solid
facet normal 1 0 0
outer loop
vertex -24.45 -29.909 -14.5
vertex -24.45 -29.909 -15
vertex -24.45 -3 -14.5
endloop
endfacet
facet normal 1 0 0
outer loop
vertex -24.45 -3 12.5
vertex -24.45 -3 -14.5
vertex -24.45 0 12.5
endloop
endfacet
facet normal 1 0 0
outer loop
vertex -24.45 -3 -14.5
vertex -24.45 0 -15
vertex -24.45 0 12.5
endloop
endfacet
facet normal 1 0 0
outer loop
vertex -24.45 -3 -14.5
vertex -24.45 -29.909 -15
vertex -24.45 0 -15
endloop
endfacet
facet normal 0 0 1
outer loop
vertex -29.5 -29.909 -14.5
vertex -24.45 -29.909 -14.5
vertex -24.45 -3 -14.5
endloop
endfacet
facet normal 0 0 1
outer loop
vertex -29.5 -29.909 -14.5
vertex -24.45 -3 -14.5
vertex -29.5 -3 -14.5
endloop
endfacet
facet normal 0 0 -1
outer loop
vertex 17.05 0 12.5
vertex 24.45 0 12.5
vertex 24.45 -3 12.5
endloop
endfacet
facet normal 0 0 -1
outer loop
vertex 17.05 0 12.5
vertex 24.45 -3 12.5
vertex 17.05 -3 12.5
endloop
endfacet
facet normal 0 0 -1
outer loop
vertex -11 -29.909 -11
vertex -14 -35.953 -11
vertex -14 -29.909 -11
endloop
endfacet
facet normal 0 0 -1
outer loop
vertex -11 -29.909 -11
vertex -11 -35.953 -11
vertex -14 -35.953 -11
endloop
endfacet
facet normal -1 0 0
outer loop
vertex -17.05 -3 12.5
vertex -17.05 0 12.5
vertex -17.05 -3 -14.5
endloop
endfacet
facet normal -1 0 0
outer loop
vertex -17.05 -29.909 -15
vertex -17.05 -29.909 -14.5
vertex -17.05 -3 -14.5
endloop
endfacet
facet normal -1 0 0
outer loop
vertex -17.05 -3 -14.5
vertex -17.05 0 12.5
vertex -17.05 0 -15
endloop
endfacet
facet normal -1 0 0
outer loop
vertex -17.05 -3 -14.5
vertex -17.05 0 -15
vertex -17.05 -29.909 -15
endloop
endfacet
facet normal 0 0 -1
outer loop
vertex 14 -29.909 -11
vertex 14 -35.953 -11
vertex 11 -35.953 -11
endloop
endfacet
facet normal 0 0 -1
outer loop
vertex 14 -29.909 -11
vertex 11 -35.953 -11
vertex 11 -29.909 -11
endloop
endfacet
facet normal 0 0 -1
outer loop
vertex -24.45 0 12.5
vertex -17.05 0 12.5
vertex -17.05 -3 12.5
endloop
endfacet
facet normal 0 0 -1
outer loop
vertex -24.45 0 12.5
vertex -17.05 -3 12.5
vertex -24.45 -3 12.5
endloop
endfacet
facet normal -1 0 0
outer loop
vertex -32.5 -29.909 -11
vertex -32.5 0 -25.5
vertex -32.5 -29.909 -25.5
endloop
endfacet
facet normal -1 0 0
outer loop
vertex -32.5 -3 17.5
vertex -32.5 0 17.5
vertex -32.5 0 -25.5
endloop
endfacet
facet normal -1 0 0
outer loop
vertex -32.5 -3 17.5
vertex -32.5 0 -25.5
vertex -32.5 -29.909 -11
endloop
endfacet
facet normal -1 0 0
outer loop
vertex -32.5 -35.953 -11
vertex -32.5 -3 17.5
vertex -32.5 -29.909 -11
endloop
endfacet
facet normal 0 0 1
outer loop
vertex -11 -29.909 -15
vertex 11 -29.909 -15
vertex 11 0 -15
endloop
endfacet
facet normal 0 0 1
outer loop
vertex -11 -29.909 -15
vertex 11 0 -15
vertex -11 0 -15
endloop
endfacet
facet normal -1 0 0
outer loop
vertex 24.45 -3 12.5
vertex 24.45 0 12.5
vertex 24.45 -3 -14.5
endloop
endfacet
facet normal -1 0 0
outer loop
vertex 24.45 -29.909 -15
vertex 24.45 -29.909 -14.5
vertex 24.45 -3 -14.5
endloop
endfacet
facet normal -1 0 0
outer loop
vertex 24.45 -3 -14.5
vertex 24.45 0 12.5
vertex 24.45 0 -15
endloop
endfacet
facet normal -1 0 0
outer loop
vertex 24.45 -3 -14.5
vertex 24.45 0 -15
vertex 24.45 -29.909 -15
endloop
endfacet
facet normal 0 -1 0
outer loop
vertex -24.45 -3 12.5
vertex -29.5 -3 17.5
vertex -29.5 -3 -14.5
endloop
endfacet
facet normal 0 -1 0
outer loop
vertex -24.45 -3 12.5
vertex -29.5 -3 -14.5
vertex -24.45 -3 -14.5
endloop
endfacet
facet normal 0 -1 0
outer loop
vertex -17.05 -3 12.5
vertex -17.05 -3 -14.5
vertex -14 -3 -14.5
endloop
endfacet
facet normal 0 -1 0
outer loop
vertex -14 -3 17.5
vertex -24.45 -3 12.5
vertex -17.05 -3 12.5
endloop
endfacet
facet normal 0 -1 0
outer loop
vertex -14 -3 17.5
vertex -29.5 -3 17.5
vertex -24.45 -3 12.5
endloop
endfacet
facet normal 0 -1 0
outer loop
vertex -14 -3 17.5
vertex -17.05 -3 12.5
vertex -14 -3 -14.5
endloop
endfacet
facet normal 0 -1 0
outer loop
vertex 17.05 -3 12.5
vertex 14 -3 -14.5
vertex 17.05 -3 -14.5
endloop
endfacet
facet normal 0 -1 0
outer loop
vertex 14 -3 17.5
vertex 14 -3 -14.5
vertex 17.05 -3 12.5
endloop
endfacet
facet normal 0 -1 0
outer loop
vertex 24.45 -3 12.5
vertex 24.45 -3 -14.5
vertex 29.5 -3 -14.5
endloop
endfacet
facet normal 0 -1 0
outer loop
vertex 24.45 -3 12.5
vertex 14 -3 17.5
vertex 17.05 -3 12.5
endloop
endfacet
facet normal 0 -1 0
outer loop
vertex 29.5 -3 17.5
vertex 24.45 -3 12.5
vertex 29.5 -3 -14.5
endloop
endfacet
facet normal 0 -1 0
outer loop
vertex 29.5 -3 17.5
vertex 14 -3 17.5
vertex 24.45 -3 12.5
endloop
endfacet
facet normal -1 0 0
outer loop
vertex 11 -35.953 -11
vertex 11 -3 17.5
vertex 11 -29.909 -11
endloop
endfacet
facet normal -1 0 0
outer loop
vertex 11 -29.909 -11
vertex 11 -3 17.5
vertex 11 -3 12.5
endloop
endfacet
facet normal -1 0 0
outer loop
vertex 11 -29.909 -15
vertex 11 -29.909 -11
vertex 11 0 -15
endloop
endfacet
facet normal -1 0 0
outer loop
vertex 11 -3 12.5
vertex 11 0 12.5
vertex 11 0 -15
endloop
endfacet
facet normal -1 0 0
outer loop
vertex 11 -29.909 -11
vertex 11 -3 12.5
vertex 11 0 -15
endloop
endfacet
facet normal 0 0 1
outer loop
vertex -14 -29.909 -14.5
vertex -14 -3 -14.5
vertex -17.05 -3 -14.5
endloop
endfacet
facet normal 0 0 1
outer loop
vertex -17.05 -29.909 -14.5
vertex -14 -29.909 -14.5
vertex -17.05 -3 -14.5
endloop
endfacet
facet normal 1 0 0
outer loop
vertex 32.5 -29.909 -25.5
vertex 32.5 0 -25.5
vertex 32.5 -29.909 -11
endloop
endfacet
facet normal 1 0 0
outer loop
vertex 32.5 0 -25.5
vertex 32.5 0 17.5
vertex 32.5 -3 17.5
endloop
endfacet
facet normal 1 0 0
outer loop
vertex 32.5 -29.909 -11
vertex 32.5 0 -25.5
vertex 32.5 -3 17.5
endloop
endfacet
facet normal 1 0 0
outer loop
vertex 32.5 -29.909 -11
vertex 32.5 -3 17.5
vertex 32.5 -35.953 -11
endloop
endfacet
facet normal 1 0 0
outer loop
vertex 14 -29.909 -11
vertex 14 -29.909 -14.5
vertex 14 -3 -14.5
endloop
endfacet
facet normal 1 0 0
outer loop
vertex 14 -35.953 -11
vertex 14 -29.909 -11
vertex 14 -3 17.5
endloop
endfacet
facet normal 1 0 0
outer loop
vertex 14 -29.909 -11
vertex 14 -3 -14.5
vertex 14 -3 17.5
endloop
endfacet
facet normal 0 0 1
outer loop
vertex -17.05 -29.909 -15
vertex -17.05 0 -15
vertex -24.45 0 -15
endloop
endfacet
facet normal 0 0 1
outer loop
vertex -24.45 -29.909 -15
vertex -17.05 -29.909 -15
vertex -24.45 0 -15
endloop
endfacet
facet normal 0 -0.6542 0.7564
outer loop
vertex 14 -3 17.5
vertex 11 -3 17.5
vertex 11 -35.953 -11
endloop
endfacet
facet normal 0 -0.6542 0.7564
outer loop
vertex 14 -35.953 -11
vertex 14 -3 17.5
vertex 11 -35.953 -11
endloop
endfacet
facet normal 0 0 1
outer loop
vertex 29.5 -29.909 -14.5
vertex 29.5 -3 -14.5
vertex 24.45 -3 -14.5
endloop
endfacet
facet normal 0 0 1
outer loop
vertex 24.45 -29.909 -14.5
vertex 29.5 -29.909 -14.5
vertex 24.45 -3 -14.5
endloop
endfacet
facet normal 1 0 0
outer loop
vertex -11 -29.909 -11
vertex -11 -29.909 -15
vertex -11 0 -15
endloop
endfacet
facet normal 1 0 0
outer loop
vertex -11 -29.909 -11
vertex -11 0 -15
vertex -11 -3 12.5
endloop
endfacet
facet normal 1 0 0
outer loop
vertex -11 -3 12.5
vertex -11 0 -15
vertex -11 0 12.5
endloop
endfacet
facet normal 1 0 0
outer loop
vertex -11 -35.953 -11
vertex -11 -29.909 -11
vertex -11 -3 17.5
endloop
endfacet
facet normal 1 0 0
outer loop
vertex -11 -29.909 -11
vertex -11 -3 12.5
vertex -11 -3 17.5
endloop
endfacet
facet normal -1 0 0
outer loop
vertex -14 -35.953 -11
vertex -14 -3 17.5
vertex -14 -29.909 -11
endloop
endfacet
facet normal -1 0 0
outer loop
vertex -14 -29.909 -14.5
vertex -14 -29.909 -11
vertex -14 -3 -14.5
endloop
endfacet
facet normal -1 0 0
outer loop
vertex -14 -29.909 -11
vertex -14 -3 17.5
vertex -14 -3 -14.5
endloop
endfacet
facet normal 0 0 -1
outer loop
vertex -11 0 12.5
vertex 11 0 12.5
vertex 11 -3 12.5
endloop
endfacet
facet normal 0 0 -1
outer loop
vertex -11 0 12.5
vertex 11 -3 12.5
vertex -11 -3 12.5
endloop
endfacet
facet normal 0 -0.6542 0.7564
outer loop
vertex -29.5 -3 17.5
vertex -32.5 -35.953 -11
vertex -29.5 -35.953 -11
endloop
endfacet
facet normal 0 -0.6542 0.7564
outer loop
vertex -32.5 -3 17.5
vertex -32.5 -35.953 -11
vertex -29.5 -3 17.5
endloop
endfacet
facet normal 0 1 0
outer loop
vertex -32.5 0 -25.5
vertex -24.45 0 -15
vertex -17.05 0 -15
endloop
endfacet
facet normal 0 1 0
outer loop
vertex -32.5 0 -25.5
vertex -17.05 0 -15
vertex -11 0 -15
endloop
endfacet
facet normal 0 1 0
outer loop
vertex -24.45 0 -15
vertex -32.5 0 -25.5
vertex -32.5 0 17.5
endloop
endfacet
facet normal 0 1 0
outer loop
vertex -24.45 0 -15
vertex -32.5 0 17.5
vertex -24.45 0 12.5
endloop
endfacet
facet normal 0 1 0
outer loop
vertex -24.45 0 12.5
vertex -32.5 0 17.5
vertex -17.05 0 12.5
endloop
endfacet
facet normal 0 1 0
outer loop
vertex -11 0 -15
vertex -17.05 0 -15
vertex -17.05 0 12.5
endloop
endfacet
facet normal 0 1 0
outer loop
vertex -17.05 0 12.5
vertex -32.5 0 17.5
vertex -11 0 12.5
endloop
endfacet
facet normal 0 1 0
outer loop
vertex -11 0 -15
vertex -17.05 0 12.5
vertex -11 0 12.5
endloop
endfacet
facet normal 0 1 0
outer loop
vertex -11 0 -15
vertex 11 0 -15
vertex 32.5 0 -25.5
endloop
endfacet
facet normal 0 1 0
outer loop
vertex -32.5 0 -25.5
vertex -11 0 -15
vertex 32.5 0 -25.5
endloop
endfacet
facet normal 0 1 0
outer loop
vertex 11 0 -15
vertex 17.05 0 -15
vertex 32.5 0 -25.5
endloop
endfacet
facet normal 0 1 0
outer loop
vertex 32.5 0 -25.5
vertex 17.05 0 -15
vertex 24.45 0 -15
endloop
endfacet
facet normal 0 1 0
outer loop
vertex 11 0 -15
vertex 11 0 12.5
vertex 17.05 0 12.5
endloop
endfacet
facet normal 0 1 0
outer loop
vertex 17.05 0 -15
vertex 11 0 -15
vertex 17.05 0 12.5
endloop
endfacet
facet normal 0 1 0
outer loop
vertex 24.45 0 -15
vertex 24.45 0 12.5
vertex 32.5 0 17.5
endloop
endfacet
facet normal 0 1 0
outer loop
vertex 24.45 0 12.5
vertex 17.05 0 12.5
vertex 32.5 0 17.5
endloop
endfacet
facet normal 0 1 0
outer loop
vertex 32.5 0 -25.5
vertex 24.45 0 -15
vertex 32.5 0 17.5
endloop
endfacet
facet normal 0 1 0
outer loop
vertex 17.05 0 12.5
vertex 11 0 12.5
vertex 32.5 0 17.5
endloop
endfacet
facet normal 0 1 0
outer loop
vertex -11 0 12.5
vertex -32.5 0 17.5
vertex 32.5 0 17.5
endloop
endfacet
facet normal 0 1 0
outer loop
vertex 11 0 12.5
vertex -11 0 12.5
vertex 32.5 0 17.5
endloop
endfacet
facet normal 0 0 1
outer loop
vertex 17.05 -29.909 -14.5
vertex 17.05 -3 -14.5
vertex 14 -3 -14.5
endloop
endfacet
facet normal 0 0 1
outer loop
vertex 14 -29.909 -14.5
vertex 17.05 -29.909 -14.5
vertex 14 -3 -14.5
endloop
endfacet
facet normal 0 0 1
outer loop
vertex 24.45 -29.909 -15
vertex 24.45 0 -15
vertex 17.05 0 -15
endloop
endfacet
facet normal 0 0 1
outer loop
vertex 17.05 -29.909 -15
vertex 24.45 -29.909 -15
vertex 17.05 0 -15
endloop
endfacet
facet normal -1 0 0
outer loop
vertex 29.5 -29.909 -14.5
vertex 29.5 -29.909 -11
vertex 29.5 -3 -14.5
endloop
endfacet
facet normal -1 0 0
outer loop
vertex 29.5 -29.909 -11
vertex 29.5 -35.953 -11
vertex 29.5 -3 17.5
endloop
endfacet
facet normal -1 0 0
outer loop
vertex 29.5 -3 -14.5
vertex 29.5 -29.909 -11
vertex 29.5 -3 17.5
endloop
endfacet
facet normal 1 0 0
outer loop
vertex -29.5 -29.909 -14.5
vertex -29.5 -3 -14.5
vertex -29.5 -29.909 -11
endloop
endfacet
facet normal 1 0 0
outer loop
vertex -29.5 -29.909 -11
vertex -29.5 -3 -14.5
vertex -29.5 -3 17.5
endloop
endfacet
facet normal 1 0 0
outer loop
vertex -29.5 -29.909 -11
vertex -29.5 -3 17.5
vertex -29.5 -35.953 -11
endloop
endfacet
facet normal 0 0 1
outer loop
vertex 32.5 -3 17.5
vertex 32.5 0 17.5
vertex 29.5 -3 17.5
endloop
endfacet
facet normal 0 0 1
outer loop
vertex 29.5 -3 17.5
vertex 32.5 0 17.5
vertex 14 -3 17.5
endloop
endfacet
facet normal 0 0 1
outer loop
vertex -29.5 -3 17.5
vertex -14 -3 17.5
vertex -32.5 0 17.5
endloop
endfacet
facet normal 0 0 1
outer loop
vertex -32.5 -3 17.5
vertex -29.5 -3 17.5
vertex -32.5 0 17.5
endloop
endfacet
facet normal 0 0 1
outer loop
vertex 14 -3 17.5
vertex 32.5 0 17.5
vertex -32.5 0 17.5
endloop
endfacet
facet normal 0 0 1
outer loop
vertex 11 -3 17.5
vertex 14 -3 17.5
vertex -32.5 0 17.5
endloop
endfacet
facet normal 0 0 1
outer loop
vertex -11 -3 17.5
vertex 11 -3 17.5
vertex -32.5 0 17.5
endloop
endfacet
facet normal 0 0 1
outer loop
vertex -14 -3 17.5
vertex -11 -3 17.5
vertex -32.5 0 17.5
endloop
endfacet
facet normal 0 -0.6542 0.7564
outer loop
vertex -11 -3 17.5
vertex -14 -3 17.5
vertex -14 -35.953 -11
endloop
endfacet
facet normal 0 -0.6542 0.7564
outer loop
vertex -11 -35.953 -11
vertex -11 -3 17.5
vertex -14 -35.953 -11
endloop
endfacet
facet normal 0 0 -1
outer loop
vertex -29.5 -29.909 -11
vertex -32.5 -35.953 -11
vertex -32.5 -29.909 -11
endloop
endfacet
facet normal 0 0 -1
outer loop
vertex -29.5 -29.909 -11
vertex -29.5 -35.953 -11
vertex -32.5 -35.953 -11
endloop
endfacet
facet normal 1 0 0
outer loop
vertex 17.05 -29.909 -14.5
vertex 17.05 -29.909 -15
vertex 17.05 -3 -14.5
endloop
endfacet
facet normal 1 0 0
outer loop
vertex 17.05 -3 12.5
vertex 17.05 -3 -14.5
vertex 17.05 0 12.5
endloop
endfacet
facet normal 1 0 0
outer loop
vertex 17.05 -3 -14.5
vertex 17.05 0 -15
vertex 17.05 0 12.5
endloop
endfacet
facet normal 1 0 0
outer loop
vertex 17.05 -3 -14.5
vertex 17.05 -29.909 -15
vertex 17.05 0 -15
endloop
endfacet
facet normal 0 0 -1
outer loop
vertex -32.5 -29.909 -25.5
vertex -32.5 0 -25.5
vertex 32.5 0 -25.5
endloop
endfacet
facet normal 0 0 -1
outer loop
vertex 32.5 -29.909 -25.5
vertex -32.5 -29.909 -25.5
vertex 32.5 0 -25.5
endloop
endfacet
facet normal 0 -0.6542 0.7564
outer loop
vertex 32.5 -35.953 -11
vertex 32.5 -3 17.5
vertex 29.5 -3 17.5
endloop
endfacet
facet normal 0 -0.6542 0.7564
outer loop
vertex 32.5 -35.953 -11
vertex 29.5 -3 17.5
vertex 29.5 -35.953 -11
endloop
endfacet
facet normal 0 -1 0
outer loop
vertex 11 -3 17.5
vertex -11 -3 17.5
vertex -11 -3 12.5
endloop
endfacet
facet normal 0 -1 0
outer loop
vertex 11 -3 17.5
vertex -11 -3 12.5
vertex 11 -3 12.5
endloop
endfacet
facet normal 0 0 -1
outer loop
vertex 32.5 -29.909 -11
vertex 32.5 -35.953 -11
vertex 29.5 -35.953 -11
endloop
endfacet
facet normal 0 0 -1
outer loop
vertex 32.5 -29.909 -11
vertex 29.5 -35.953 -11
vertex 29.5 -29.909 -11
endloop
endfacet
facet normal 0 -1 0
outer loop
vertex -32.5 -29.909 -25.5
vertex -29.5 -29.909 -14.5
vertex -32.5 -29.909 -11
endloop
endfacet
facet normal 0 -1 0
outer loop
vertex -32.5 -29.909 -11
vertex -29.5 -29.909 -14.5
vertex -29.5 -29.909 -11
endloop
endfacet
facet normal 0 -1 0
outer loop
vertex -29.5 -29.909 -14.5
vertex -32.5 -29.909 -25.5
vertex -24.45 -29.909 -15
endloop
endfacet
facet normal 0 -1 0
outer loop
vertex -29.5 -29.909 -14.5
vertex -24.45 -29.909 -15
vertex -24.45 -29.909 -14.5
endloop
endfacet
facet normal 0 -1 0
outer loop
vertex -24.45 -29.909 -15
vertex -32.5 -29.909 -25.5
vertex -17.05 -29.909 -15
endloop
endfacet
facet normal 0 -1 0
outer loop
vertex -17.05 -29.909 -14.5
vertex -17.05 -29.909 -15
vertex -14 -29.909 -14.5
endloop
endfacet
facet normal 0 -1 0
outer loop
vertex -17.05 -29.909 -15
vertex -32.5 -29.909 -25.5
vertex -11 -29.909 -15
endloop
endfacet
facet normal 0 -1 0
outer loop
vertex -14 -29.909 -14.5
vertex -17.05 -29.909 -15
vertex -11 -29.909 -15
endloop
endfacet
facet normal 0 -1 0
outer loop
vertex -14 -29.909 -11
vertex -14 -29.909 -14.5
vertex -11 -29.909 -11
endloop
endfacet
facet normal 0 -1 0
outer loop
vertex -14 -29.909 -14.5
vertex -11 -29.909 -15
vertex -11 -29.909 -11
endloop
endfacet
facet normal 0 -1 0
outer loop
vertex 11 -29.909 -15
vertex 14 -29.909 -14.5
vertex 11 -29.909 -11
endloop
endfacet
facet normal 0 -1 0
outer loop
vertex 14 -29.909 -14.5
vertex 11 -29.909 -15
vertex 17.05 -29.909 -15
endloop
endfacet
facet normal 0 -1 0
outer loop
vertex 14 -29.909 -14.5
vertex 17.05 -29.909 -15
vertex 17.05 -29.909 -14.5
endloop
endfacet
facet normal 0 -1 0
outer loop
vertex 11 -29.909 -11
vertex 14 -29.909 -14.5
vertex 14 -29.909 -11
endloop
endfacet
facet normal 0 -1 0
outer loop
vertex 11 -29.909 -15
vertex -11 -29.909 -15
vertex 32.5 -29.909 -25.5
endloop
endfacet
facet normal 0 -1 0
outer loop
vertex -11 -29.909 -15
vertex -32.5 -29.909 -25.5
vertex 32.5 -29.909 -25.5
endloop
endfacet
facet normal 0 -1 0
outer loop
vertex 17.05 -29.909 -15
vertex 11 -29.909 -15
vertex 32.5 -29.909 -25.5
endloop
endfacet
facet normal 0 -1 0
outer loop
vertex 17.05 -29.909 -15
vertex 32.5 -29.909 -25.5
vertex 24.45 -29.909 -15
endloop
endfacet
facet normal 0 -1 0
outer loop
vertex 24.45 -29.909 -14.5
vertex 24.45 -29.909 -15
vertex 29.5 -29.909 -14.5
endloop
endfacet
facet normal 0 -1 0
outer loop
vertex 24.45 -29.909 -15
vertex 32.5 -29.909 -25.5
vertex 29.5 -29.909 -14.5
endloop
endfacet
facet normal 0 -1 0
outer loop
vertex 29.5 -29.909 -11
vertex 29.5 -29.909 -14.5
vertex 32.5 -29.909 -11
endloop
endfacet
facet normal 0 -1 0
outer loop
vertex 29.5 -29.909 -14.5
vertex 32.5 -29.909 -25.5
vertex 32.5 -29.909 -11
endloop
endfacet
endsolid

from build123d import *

# Parameters (mm, degrees)
F1_DEPTH  = 3
F2_DEPTH  = 40
F5_DEPTH  = 37
F7_DEPTH  = 3
F8_DEPTH  = 3
F9_DEPTH  = 90
F10_DEPTH = 8
F11_R     = 4
F11_R_2   = 1.4
F12_DEPTH = 15
F13_DEPTH = 18
F14_W     = 10.0909090909
F14_H     = 18
F15_DEPTH = 101.4
F16_DEPTH = 5


with BuildPart() as f1:
    # F0 (on Front) → F1 (new body)
    with BuildSketch(Plane.XZ):
        Polygon((32.5, 17.5), (-32.5, 17.5), (-32.5, -14.5), (-24.45, -14.5), (-24.45, 15), (-20.75, 15), (-17.05, 15), (-17.05, -14.5), (-11, -14.5), (-11, 15), (11, 15), (11, -14.5), (17.05, -14.5), (17.05, 15), (20.75, 15), (24.45, 15), (24.45, -14.5), (32.5, -14.5), align=None)
    extrude(amount=F1_DEPTH)

    # F0 (on Front) → F2 (join)
    with BuildSketch(Plane.XZ):
        Polygon((-24.45, -14.5), (-32.5, -14.5), (-32.5, -17.5), (32.5, -17.5), (32.5, -14.5), (24.45, -14.5), (24.45, -15), (20.75, -15), (17.05, -15), (17.05, -14.5), (11, -14.5), (11, -15), (-11, -15), (-11, -14.5), (-17.05, -14.5), (-17.05, -15), (-20.75, -15), (-24.45, -15), align=None)
    extrude(amount=F2_DEPTH)

    # F4 (on face) → F5 (join)
    with BuildSketch(Plane.XZ.offset(3)):
        Polygon((-14, -14.5), (-11, -14.5), (-11, 15), (-11, 17.5), (-14, 17.5), align=None)
        Polygon((11, 17.5), (11, 15), (11, -14.5), (14, -14.5), (14, 17.5), align=None)
    extrude(amount=F5_DEPTH)

    # F6 (on face) → F7 (join)
    with BuildSketch(Plane.YZ.offset(32.5)):
        Polygon((-3, -14.5), (-3, 17.5), (-40, -14.5), align=None)
    extrude(amount=-F7_DEPTH)

    # F3 (on face) → F8 (join)
    with BuildSketch(Plane(origin=(-32.5, 0, 0), x_dir=(0, -1, 0), z_dir=(-1, 0, 0))):
        Polygon((40, -14.5), (3, 17.5), (3, -14.5), align=None)
    extrude(amount=-F8_DEPTH)

    # F3 (on face) → F9 (cut)
    with BuildSketch(Plane(origin=(-32.5, 0, 0), x_dir=(0, -1, 0), z_dir=(-1, 0, 0))):
        Polygon((45.3402064741, 20.7598140836), (3, 17.5), (40, -14.5), align=None)
    extrude(amount=-F9_DEPTH, mode=Mode.SUBTRACT)

    # F10 (add): a face of the model
    f10_faces = [f1.faces().sort_by_distance(p)[0] for p in [
        (0, -20, -17.5),
    ]]
    extrude(f10_faces, amount=F10_DEPTH)

    # F11 (on face) → F12 (cut)
    with BuildSketch(Plane(origin=(0, 0, -25.5), x_dir=(1, 0, 0), z_dir=(0, 0, -1))):
        with Locations((-21.75, -16.4545454545)):
            Circle(F11_R)
        with Locations((-21.75, -16.4545454545)):
            Circle(F11_R_2, mode=Mode.SUBTRACT)
        with Locations((21.75, -16.4545454545)):
            Circle(F11_R)
        with Locations((21.75, -16.4545454545)):
            Circle(F11_R_2, mode=Mode.SUBTRACT)
    extrude(amount=-F12_DEPTH, mode=Mode.SUBTRACT)

    # F11 (on face) → F13 (cut)
    with BuildSketch(Plane(origin=(0, 0, -25.5), x_dir=(1, 0, 0), z_dir=(0, 0, -1))):
        with Locations((-21.75, -16.4545454545)):
            Circle(F11_R_2)
        with Locations((21.75, -16.4545454545)):
            Circle(F11_R_2)
    extrude(amount=-F13_DEPTH, mode=Mode.SUBTRACT)

    # F14 (on face) → F15 (cut)
    with BuildSketch(Plane.YZ.offset(32.5)):
        with Locations((-34.9545454545, -20)):
            Rectangle(F14_W, F14_H)
    extrude(amount=-F15_DEPTH, mode=Mode.SUBTRACT)

    # F16 (add): a face of the model
    f16_faces = [f1.faces().sort_by_distance(p)[0] for p in [
        (0, -1.5, 17.5),
    ]]
    extrude(f16_faces, amount=-F16_DEPTH)


solid = f1.part
